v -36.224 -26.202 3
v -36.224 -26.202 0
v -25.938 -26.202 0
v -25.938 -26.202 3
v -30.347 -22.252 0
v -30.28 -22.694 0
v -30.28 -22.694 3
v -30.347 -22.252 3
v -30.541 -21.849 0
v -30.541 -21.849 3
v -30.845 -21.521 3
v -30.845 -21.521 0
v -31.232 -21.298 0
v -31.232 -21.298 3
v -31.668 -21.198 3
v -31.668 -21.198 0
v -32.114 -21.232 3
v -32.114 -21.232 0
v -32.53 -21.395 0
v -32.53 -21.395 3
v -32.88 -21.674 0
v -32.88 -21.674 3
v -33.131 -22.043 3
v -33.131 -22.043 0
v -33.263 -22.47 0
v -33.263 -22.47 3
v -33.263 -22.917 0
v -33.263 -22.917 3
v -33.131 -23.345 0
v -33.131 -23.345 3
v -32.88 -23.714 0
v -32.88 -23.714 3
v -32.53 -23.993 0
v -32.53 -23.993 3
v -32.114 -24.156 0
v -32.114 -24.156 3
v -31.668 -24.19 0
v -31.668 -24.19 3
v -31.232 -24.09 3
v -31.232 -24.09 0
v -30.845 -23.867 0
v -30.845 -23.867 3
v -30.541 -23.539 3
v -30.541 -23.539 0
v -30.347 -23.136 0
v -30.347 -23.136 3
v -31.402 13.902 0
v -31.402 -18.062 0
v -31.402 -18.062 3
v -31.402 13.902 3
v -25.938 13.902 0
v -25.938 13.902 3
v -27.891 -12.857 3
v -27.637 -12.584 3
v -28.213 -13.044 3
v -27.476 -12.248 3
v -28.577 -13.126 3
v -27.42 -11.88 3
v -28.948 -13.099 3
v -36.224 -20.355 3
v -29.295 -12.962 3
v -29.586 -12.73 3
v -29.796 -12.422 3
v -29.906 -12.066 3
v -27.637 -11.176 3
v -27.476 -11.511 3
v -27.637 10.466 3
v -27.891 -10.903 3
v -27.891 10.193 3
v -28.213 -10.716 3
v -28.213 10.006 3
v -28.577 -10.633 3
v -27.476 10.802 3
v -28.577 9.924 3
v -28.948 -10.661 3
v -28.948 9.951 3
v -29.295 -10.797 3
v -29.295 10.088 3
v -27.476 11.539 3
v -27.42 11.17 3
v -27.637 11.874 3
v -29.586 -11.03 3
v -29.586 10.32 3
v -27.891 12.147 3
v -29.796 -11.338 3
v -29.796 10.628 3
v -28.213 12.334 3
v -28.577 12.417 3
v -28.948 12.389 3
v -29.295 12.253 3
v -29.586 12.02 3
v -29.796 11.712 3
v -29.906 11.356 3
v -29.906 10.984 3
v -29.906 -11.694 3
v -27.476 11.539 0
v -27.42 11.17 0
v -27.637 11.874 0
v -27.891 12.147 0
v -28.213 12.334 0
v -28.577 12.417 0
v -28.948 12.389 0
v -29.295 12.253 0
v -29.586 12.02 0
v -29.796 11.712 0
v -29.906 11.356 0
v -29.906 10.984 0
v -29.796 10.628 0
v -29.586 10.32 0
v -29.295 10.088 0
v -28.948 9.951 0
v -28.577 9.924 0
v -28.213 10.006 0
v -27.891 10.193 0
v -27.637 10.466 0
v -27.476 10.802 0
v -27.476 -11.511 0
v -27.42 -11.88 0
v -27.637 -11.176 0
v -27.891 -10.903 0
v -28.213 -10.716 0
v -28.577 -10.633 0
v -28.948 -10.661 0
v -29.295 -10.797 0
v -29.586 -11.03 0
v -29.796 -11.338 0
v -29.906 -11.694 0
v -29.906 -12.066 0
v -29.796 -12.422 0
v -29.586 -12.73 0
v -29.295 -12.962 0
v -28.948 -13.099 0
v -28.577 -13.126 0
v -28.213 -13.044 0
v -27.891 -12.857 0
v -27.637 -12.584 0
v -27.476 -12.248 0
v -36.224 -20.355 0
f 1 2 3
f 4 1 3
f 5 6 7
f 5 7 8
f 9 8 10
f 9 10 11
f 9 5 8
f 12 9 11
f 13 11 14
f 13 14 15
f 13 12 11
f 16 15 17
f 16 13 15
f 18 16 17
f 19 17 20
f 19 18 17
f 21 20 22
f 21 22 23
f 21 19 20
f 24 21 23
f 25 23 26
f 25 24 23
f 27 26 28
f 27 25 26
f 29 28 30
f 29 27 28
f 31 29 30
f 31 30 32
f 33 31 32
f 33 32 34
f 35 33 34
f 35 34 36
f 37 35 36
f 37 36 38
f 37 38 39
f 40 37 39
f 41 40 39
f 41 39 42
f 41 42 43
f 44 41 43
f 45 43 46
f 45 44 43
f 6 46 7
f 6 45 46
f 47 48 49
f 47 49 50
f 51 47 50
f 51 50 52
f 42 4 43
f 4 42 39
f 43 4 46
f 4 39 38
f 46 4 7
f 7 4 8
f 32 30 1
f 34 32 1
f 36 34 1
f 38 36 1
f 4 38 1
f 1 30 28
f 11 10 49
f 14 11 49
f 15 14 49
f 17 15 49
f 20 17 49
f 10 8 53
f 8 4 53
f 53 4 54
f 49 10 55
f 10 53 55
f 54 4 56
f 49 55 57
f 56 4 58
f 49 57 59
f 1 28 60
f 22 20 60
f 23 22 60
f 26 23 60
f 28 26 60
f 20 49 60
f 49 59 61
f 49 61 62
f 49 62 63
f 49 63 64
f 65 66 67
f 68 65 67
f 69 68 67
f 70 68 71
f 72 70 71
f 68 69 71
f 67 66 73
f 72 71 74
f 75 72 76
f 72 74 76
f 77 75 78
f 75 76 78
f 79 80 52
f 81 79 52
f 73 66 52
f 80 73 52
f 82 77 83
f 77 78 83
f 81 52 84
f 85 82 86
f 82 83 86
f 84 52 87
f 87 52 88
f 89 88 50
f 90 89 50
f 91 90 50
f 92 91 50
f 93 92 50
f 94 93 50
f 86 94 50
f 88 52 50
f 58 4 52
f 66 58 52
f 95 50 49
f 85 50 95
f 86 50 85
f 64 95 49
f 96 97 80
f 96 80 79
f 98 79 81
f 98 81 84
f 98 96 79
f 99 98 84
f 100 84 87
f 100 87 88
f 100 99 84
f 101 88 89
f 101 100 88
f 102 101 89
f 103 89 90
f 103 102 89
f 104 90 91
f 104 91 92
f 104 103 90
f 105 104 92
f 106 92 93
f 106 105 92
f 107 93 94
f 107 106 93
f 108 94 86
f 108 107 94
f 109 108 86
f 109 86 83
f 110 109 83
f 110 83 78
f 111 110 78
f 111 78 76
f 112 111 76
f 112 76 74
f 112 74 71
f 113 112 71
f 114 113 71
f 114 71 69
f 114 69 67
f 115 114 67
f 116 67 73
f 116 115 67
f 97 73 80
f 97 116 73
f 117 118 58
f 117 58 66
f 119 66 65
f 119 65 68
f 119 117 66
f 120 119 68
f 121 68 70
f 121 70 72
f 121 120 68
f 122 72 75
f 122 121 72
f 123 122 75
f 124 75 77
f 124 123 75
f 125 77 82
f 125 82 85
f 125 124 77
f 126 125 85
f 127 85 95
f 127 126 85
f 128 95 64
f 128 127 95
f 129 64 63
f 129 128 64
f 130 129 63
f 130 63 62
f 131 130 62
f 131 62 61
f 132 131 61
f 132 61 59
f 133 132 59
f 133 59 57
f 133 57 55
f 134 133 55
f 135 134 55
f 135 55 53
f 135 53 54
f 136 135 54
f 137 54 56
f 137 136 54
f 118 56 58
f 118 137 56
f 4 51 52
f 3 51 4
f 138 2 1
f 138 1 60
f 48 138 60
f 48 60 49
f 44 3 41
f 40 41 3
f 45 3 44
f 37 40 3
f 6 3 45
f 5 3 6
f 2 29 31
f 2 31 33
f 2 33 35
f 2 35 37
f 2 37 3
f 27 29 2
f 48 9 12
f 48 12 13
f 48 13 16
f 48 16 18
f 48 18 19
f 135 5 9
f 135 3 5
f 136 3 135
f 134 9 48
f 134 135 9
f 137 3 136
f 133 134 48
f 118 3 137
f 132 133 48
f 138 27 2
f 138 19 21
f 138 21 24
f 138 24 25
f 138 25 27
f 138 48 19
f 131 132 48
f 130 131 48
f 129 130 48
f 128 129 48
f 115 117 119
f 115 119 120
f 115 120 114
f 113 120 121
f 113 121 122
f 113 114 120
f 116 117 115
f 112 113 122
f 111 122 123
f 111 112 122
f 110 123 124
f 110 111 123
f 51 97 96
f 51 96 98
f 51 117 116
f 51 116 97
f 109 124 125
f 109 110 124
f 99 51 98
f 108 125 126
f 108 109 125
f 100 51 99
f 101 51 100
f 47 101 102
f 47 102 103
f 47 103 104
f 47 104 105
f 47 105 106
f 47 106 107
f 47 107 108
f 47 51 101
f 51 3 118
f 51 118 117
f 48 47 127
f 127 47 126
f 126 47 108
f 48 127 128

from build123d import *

# Parameters (mm, degrees)
SKETCH1_R           = 1.25
SKETCH1_R_2         = 1.5
BOSS_EXTRUDE1_DEPTH = 3


with BuildPart() as part:
    # Sketch1 → Boss-Extrude1 (new body)
    with BuildSketch(Plane.XY):
        Polygon((-31.401650429, 13.901650429), (-25.938490407, 13.901650429), (-25.938490407, -26.201638424), (-31.401650429, -26.201638424), (-36.223809579, -26.201638424), (-36.223809579, -20.354504277), (-31.401650429, -18.062129594), align=None)
        with Locations((-28.670070418, 11.170070418)):
            Circle(SKETCH1_R, mode=Mode.SUBTRACT)
        with Locations((-28.670070418, -11.879929582)):
            Circle(SKETCH1_R, mode=Mode.SUBTRACT)
        with Locations((-31.779993959, -22.69389364)):
            Circle(SKETCH1_R_2, mode=Mode.SUBTRACT)
    extrude(amount=BOSS_EXTRUDE1_DEPTH)


solid = part.part
